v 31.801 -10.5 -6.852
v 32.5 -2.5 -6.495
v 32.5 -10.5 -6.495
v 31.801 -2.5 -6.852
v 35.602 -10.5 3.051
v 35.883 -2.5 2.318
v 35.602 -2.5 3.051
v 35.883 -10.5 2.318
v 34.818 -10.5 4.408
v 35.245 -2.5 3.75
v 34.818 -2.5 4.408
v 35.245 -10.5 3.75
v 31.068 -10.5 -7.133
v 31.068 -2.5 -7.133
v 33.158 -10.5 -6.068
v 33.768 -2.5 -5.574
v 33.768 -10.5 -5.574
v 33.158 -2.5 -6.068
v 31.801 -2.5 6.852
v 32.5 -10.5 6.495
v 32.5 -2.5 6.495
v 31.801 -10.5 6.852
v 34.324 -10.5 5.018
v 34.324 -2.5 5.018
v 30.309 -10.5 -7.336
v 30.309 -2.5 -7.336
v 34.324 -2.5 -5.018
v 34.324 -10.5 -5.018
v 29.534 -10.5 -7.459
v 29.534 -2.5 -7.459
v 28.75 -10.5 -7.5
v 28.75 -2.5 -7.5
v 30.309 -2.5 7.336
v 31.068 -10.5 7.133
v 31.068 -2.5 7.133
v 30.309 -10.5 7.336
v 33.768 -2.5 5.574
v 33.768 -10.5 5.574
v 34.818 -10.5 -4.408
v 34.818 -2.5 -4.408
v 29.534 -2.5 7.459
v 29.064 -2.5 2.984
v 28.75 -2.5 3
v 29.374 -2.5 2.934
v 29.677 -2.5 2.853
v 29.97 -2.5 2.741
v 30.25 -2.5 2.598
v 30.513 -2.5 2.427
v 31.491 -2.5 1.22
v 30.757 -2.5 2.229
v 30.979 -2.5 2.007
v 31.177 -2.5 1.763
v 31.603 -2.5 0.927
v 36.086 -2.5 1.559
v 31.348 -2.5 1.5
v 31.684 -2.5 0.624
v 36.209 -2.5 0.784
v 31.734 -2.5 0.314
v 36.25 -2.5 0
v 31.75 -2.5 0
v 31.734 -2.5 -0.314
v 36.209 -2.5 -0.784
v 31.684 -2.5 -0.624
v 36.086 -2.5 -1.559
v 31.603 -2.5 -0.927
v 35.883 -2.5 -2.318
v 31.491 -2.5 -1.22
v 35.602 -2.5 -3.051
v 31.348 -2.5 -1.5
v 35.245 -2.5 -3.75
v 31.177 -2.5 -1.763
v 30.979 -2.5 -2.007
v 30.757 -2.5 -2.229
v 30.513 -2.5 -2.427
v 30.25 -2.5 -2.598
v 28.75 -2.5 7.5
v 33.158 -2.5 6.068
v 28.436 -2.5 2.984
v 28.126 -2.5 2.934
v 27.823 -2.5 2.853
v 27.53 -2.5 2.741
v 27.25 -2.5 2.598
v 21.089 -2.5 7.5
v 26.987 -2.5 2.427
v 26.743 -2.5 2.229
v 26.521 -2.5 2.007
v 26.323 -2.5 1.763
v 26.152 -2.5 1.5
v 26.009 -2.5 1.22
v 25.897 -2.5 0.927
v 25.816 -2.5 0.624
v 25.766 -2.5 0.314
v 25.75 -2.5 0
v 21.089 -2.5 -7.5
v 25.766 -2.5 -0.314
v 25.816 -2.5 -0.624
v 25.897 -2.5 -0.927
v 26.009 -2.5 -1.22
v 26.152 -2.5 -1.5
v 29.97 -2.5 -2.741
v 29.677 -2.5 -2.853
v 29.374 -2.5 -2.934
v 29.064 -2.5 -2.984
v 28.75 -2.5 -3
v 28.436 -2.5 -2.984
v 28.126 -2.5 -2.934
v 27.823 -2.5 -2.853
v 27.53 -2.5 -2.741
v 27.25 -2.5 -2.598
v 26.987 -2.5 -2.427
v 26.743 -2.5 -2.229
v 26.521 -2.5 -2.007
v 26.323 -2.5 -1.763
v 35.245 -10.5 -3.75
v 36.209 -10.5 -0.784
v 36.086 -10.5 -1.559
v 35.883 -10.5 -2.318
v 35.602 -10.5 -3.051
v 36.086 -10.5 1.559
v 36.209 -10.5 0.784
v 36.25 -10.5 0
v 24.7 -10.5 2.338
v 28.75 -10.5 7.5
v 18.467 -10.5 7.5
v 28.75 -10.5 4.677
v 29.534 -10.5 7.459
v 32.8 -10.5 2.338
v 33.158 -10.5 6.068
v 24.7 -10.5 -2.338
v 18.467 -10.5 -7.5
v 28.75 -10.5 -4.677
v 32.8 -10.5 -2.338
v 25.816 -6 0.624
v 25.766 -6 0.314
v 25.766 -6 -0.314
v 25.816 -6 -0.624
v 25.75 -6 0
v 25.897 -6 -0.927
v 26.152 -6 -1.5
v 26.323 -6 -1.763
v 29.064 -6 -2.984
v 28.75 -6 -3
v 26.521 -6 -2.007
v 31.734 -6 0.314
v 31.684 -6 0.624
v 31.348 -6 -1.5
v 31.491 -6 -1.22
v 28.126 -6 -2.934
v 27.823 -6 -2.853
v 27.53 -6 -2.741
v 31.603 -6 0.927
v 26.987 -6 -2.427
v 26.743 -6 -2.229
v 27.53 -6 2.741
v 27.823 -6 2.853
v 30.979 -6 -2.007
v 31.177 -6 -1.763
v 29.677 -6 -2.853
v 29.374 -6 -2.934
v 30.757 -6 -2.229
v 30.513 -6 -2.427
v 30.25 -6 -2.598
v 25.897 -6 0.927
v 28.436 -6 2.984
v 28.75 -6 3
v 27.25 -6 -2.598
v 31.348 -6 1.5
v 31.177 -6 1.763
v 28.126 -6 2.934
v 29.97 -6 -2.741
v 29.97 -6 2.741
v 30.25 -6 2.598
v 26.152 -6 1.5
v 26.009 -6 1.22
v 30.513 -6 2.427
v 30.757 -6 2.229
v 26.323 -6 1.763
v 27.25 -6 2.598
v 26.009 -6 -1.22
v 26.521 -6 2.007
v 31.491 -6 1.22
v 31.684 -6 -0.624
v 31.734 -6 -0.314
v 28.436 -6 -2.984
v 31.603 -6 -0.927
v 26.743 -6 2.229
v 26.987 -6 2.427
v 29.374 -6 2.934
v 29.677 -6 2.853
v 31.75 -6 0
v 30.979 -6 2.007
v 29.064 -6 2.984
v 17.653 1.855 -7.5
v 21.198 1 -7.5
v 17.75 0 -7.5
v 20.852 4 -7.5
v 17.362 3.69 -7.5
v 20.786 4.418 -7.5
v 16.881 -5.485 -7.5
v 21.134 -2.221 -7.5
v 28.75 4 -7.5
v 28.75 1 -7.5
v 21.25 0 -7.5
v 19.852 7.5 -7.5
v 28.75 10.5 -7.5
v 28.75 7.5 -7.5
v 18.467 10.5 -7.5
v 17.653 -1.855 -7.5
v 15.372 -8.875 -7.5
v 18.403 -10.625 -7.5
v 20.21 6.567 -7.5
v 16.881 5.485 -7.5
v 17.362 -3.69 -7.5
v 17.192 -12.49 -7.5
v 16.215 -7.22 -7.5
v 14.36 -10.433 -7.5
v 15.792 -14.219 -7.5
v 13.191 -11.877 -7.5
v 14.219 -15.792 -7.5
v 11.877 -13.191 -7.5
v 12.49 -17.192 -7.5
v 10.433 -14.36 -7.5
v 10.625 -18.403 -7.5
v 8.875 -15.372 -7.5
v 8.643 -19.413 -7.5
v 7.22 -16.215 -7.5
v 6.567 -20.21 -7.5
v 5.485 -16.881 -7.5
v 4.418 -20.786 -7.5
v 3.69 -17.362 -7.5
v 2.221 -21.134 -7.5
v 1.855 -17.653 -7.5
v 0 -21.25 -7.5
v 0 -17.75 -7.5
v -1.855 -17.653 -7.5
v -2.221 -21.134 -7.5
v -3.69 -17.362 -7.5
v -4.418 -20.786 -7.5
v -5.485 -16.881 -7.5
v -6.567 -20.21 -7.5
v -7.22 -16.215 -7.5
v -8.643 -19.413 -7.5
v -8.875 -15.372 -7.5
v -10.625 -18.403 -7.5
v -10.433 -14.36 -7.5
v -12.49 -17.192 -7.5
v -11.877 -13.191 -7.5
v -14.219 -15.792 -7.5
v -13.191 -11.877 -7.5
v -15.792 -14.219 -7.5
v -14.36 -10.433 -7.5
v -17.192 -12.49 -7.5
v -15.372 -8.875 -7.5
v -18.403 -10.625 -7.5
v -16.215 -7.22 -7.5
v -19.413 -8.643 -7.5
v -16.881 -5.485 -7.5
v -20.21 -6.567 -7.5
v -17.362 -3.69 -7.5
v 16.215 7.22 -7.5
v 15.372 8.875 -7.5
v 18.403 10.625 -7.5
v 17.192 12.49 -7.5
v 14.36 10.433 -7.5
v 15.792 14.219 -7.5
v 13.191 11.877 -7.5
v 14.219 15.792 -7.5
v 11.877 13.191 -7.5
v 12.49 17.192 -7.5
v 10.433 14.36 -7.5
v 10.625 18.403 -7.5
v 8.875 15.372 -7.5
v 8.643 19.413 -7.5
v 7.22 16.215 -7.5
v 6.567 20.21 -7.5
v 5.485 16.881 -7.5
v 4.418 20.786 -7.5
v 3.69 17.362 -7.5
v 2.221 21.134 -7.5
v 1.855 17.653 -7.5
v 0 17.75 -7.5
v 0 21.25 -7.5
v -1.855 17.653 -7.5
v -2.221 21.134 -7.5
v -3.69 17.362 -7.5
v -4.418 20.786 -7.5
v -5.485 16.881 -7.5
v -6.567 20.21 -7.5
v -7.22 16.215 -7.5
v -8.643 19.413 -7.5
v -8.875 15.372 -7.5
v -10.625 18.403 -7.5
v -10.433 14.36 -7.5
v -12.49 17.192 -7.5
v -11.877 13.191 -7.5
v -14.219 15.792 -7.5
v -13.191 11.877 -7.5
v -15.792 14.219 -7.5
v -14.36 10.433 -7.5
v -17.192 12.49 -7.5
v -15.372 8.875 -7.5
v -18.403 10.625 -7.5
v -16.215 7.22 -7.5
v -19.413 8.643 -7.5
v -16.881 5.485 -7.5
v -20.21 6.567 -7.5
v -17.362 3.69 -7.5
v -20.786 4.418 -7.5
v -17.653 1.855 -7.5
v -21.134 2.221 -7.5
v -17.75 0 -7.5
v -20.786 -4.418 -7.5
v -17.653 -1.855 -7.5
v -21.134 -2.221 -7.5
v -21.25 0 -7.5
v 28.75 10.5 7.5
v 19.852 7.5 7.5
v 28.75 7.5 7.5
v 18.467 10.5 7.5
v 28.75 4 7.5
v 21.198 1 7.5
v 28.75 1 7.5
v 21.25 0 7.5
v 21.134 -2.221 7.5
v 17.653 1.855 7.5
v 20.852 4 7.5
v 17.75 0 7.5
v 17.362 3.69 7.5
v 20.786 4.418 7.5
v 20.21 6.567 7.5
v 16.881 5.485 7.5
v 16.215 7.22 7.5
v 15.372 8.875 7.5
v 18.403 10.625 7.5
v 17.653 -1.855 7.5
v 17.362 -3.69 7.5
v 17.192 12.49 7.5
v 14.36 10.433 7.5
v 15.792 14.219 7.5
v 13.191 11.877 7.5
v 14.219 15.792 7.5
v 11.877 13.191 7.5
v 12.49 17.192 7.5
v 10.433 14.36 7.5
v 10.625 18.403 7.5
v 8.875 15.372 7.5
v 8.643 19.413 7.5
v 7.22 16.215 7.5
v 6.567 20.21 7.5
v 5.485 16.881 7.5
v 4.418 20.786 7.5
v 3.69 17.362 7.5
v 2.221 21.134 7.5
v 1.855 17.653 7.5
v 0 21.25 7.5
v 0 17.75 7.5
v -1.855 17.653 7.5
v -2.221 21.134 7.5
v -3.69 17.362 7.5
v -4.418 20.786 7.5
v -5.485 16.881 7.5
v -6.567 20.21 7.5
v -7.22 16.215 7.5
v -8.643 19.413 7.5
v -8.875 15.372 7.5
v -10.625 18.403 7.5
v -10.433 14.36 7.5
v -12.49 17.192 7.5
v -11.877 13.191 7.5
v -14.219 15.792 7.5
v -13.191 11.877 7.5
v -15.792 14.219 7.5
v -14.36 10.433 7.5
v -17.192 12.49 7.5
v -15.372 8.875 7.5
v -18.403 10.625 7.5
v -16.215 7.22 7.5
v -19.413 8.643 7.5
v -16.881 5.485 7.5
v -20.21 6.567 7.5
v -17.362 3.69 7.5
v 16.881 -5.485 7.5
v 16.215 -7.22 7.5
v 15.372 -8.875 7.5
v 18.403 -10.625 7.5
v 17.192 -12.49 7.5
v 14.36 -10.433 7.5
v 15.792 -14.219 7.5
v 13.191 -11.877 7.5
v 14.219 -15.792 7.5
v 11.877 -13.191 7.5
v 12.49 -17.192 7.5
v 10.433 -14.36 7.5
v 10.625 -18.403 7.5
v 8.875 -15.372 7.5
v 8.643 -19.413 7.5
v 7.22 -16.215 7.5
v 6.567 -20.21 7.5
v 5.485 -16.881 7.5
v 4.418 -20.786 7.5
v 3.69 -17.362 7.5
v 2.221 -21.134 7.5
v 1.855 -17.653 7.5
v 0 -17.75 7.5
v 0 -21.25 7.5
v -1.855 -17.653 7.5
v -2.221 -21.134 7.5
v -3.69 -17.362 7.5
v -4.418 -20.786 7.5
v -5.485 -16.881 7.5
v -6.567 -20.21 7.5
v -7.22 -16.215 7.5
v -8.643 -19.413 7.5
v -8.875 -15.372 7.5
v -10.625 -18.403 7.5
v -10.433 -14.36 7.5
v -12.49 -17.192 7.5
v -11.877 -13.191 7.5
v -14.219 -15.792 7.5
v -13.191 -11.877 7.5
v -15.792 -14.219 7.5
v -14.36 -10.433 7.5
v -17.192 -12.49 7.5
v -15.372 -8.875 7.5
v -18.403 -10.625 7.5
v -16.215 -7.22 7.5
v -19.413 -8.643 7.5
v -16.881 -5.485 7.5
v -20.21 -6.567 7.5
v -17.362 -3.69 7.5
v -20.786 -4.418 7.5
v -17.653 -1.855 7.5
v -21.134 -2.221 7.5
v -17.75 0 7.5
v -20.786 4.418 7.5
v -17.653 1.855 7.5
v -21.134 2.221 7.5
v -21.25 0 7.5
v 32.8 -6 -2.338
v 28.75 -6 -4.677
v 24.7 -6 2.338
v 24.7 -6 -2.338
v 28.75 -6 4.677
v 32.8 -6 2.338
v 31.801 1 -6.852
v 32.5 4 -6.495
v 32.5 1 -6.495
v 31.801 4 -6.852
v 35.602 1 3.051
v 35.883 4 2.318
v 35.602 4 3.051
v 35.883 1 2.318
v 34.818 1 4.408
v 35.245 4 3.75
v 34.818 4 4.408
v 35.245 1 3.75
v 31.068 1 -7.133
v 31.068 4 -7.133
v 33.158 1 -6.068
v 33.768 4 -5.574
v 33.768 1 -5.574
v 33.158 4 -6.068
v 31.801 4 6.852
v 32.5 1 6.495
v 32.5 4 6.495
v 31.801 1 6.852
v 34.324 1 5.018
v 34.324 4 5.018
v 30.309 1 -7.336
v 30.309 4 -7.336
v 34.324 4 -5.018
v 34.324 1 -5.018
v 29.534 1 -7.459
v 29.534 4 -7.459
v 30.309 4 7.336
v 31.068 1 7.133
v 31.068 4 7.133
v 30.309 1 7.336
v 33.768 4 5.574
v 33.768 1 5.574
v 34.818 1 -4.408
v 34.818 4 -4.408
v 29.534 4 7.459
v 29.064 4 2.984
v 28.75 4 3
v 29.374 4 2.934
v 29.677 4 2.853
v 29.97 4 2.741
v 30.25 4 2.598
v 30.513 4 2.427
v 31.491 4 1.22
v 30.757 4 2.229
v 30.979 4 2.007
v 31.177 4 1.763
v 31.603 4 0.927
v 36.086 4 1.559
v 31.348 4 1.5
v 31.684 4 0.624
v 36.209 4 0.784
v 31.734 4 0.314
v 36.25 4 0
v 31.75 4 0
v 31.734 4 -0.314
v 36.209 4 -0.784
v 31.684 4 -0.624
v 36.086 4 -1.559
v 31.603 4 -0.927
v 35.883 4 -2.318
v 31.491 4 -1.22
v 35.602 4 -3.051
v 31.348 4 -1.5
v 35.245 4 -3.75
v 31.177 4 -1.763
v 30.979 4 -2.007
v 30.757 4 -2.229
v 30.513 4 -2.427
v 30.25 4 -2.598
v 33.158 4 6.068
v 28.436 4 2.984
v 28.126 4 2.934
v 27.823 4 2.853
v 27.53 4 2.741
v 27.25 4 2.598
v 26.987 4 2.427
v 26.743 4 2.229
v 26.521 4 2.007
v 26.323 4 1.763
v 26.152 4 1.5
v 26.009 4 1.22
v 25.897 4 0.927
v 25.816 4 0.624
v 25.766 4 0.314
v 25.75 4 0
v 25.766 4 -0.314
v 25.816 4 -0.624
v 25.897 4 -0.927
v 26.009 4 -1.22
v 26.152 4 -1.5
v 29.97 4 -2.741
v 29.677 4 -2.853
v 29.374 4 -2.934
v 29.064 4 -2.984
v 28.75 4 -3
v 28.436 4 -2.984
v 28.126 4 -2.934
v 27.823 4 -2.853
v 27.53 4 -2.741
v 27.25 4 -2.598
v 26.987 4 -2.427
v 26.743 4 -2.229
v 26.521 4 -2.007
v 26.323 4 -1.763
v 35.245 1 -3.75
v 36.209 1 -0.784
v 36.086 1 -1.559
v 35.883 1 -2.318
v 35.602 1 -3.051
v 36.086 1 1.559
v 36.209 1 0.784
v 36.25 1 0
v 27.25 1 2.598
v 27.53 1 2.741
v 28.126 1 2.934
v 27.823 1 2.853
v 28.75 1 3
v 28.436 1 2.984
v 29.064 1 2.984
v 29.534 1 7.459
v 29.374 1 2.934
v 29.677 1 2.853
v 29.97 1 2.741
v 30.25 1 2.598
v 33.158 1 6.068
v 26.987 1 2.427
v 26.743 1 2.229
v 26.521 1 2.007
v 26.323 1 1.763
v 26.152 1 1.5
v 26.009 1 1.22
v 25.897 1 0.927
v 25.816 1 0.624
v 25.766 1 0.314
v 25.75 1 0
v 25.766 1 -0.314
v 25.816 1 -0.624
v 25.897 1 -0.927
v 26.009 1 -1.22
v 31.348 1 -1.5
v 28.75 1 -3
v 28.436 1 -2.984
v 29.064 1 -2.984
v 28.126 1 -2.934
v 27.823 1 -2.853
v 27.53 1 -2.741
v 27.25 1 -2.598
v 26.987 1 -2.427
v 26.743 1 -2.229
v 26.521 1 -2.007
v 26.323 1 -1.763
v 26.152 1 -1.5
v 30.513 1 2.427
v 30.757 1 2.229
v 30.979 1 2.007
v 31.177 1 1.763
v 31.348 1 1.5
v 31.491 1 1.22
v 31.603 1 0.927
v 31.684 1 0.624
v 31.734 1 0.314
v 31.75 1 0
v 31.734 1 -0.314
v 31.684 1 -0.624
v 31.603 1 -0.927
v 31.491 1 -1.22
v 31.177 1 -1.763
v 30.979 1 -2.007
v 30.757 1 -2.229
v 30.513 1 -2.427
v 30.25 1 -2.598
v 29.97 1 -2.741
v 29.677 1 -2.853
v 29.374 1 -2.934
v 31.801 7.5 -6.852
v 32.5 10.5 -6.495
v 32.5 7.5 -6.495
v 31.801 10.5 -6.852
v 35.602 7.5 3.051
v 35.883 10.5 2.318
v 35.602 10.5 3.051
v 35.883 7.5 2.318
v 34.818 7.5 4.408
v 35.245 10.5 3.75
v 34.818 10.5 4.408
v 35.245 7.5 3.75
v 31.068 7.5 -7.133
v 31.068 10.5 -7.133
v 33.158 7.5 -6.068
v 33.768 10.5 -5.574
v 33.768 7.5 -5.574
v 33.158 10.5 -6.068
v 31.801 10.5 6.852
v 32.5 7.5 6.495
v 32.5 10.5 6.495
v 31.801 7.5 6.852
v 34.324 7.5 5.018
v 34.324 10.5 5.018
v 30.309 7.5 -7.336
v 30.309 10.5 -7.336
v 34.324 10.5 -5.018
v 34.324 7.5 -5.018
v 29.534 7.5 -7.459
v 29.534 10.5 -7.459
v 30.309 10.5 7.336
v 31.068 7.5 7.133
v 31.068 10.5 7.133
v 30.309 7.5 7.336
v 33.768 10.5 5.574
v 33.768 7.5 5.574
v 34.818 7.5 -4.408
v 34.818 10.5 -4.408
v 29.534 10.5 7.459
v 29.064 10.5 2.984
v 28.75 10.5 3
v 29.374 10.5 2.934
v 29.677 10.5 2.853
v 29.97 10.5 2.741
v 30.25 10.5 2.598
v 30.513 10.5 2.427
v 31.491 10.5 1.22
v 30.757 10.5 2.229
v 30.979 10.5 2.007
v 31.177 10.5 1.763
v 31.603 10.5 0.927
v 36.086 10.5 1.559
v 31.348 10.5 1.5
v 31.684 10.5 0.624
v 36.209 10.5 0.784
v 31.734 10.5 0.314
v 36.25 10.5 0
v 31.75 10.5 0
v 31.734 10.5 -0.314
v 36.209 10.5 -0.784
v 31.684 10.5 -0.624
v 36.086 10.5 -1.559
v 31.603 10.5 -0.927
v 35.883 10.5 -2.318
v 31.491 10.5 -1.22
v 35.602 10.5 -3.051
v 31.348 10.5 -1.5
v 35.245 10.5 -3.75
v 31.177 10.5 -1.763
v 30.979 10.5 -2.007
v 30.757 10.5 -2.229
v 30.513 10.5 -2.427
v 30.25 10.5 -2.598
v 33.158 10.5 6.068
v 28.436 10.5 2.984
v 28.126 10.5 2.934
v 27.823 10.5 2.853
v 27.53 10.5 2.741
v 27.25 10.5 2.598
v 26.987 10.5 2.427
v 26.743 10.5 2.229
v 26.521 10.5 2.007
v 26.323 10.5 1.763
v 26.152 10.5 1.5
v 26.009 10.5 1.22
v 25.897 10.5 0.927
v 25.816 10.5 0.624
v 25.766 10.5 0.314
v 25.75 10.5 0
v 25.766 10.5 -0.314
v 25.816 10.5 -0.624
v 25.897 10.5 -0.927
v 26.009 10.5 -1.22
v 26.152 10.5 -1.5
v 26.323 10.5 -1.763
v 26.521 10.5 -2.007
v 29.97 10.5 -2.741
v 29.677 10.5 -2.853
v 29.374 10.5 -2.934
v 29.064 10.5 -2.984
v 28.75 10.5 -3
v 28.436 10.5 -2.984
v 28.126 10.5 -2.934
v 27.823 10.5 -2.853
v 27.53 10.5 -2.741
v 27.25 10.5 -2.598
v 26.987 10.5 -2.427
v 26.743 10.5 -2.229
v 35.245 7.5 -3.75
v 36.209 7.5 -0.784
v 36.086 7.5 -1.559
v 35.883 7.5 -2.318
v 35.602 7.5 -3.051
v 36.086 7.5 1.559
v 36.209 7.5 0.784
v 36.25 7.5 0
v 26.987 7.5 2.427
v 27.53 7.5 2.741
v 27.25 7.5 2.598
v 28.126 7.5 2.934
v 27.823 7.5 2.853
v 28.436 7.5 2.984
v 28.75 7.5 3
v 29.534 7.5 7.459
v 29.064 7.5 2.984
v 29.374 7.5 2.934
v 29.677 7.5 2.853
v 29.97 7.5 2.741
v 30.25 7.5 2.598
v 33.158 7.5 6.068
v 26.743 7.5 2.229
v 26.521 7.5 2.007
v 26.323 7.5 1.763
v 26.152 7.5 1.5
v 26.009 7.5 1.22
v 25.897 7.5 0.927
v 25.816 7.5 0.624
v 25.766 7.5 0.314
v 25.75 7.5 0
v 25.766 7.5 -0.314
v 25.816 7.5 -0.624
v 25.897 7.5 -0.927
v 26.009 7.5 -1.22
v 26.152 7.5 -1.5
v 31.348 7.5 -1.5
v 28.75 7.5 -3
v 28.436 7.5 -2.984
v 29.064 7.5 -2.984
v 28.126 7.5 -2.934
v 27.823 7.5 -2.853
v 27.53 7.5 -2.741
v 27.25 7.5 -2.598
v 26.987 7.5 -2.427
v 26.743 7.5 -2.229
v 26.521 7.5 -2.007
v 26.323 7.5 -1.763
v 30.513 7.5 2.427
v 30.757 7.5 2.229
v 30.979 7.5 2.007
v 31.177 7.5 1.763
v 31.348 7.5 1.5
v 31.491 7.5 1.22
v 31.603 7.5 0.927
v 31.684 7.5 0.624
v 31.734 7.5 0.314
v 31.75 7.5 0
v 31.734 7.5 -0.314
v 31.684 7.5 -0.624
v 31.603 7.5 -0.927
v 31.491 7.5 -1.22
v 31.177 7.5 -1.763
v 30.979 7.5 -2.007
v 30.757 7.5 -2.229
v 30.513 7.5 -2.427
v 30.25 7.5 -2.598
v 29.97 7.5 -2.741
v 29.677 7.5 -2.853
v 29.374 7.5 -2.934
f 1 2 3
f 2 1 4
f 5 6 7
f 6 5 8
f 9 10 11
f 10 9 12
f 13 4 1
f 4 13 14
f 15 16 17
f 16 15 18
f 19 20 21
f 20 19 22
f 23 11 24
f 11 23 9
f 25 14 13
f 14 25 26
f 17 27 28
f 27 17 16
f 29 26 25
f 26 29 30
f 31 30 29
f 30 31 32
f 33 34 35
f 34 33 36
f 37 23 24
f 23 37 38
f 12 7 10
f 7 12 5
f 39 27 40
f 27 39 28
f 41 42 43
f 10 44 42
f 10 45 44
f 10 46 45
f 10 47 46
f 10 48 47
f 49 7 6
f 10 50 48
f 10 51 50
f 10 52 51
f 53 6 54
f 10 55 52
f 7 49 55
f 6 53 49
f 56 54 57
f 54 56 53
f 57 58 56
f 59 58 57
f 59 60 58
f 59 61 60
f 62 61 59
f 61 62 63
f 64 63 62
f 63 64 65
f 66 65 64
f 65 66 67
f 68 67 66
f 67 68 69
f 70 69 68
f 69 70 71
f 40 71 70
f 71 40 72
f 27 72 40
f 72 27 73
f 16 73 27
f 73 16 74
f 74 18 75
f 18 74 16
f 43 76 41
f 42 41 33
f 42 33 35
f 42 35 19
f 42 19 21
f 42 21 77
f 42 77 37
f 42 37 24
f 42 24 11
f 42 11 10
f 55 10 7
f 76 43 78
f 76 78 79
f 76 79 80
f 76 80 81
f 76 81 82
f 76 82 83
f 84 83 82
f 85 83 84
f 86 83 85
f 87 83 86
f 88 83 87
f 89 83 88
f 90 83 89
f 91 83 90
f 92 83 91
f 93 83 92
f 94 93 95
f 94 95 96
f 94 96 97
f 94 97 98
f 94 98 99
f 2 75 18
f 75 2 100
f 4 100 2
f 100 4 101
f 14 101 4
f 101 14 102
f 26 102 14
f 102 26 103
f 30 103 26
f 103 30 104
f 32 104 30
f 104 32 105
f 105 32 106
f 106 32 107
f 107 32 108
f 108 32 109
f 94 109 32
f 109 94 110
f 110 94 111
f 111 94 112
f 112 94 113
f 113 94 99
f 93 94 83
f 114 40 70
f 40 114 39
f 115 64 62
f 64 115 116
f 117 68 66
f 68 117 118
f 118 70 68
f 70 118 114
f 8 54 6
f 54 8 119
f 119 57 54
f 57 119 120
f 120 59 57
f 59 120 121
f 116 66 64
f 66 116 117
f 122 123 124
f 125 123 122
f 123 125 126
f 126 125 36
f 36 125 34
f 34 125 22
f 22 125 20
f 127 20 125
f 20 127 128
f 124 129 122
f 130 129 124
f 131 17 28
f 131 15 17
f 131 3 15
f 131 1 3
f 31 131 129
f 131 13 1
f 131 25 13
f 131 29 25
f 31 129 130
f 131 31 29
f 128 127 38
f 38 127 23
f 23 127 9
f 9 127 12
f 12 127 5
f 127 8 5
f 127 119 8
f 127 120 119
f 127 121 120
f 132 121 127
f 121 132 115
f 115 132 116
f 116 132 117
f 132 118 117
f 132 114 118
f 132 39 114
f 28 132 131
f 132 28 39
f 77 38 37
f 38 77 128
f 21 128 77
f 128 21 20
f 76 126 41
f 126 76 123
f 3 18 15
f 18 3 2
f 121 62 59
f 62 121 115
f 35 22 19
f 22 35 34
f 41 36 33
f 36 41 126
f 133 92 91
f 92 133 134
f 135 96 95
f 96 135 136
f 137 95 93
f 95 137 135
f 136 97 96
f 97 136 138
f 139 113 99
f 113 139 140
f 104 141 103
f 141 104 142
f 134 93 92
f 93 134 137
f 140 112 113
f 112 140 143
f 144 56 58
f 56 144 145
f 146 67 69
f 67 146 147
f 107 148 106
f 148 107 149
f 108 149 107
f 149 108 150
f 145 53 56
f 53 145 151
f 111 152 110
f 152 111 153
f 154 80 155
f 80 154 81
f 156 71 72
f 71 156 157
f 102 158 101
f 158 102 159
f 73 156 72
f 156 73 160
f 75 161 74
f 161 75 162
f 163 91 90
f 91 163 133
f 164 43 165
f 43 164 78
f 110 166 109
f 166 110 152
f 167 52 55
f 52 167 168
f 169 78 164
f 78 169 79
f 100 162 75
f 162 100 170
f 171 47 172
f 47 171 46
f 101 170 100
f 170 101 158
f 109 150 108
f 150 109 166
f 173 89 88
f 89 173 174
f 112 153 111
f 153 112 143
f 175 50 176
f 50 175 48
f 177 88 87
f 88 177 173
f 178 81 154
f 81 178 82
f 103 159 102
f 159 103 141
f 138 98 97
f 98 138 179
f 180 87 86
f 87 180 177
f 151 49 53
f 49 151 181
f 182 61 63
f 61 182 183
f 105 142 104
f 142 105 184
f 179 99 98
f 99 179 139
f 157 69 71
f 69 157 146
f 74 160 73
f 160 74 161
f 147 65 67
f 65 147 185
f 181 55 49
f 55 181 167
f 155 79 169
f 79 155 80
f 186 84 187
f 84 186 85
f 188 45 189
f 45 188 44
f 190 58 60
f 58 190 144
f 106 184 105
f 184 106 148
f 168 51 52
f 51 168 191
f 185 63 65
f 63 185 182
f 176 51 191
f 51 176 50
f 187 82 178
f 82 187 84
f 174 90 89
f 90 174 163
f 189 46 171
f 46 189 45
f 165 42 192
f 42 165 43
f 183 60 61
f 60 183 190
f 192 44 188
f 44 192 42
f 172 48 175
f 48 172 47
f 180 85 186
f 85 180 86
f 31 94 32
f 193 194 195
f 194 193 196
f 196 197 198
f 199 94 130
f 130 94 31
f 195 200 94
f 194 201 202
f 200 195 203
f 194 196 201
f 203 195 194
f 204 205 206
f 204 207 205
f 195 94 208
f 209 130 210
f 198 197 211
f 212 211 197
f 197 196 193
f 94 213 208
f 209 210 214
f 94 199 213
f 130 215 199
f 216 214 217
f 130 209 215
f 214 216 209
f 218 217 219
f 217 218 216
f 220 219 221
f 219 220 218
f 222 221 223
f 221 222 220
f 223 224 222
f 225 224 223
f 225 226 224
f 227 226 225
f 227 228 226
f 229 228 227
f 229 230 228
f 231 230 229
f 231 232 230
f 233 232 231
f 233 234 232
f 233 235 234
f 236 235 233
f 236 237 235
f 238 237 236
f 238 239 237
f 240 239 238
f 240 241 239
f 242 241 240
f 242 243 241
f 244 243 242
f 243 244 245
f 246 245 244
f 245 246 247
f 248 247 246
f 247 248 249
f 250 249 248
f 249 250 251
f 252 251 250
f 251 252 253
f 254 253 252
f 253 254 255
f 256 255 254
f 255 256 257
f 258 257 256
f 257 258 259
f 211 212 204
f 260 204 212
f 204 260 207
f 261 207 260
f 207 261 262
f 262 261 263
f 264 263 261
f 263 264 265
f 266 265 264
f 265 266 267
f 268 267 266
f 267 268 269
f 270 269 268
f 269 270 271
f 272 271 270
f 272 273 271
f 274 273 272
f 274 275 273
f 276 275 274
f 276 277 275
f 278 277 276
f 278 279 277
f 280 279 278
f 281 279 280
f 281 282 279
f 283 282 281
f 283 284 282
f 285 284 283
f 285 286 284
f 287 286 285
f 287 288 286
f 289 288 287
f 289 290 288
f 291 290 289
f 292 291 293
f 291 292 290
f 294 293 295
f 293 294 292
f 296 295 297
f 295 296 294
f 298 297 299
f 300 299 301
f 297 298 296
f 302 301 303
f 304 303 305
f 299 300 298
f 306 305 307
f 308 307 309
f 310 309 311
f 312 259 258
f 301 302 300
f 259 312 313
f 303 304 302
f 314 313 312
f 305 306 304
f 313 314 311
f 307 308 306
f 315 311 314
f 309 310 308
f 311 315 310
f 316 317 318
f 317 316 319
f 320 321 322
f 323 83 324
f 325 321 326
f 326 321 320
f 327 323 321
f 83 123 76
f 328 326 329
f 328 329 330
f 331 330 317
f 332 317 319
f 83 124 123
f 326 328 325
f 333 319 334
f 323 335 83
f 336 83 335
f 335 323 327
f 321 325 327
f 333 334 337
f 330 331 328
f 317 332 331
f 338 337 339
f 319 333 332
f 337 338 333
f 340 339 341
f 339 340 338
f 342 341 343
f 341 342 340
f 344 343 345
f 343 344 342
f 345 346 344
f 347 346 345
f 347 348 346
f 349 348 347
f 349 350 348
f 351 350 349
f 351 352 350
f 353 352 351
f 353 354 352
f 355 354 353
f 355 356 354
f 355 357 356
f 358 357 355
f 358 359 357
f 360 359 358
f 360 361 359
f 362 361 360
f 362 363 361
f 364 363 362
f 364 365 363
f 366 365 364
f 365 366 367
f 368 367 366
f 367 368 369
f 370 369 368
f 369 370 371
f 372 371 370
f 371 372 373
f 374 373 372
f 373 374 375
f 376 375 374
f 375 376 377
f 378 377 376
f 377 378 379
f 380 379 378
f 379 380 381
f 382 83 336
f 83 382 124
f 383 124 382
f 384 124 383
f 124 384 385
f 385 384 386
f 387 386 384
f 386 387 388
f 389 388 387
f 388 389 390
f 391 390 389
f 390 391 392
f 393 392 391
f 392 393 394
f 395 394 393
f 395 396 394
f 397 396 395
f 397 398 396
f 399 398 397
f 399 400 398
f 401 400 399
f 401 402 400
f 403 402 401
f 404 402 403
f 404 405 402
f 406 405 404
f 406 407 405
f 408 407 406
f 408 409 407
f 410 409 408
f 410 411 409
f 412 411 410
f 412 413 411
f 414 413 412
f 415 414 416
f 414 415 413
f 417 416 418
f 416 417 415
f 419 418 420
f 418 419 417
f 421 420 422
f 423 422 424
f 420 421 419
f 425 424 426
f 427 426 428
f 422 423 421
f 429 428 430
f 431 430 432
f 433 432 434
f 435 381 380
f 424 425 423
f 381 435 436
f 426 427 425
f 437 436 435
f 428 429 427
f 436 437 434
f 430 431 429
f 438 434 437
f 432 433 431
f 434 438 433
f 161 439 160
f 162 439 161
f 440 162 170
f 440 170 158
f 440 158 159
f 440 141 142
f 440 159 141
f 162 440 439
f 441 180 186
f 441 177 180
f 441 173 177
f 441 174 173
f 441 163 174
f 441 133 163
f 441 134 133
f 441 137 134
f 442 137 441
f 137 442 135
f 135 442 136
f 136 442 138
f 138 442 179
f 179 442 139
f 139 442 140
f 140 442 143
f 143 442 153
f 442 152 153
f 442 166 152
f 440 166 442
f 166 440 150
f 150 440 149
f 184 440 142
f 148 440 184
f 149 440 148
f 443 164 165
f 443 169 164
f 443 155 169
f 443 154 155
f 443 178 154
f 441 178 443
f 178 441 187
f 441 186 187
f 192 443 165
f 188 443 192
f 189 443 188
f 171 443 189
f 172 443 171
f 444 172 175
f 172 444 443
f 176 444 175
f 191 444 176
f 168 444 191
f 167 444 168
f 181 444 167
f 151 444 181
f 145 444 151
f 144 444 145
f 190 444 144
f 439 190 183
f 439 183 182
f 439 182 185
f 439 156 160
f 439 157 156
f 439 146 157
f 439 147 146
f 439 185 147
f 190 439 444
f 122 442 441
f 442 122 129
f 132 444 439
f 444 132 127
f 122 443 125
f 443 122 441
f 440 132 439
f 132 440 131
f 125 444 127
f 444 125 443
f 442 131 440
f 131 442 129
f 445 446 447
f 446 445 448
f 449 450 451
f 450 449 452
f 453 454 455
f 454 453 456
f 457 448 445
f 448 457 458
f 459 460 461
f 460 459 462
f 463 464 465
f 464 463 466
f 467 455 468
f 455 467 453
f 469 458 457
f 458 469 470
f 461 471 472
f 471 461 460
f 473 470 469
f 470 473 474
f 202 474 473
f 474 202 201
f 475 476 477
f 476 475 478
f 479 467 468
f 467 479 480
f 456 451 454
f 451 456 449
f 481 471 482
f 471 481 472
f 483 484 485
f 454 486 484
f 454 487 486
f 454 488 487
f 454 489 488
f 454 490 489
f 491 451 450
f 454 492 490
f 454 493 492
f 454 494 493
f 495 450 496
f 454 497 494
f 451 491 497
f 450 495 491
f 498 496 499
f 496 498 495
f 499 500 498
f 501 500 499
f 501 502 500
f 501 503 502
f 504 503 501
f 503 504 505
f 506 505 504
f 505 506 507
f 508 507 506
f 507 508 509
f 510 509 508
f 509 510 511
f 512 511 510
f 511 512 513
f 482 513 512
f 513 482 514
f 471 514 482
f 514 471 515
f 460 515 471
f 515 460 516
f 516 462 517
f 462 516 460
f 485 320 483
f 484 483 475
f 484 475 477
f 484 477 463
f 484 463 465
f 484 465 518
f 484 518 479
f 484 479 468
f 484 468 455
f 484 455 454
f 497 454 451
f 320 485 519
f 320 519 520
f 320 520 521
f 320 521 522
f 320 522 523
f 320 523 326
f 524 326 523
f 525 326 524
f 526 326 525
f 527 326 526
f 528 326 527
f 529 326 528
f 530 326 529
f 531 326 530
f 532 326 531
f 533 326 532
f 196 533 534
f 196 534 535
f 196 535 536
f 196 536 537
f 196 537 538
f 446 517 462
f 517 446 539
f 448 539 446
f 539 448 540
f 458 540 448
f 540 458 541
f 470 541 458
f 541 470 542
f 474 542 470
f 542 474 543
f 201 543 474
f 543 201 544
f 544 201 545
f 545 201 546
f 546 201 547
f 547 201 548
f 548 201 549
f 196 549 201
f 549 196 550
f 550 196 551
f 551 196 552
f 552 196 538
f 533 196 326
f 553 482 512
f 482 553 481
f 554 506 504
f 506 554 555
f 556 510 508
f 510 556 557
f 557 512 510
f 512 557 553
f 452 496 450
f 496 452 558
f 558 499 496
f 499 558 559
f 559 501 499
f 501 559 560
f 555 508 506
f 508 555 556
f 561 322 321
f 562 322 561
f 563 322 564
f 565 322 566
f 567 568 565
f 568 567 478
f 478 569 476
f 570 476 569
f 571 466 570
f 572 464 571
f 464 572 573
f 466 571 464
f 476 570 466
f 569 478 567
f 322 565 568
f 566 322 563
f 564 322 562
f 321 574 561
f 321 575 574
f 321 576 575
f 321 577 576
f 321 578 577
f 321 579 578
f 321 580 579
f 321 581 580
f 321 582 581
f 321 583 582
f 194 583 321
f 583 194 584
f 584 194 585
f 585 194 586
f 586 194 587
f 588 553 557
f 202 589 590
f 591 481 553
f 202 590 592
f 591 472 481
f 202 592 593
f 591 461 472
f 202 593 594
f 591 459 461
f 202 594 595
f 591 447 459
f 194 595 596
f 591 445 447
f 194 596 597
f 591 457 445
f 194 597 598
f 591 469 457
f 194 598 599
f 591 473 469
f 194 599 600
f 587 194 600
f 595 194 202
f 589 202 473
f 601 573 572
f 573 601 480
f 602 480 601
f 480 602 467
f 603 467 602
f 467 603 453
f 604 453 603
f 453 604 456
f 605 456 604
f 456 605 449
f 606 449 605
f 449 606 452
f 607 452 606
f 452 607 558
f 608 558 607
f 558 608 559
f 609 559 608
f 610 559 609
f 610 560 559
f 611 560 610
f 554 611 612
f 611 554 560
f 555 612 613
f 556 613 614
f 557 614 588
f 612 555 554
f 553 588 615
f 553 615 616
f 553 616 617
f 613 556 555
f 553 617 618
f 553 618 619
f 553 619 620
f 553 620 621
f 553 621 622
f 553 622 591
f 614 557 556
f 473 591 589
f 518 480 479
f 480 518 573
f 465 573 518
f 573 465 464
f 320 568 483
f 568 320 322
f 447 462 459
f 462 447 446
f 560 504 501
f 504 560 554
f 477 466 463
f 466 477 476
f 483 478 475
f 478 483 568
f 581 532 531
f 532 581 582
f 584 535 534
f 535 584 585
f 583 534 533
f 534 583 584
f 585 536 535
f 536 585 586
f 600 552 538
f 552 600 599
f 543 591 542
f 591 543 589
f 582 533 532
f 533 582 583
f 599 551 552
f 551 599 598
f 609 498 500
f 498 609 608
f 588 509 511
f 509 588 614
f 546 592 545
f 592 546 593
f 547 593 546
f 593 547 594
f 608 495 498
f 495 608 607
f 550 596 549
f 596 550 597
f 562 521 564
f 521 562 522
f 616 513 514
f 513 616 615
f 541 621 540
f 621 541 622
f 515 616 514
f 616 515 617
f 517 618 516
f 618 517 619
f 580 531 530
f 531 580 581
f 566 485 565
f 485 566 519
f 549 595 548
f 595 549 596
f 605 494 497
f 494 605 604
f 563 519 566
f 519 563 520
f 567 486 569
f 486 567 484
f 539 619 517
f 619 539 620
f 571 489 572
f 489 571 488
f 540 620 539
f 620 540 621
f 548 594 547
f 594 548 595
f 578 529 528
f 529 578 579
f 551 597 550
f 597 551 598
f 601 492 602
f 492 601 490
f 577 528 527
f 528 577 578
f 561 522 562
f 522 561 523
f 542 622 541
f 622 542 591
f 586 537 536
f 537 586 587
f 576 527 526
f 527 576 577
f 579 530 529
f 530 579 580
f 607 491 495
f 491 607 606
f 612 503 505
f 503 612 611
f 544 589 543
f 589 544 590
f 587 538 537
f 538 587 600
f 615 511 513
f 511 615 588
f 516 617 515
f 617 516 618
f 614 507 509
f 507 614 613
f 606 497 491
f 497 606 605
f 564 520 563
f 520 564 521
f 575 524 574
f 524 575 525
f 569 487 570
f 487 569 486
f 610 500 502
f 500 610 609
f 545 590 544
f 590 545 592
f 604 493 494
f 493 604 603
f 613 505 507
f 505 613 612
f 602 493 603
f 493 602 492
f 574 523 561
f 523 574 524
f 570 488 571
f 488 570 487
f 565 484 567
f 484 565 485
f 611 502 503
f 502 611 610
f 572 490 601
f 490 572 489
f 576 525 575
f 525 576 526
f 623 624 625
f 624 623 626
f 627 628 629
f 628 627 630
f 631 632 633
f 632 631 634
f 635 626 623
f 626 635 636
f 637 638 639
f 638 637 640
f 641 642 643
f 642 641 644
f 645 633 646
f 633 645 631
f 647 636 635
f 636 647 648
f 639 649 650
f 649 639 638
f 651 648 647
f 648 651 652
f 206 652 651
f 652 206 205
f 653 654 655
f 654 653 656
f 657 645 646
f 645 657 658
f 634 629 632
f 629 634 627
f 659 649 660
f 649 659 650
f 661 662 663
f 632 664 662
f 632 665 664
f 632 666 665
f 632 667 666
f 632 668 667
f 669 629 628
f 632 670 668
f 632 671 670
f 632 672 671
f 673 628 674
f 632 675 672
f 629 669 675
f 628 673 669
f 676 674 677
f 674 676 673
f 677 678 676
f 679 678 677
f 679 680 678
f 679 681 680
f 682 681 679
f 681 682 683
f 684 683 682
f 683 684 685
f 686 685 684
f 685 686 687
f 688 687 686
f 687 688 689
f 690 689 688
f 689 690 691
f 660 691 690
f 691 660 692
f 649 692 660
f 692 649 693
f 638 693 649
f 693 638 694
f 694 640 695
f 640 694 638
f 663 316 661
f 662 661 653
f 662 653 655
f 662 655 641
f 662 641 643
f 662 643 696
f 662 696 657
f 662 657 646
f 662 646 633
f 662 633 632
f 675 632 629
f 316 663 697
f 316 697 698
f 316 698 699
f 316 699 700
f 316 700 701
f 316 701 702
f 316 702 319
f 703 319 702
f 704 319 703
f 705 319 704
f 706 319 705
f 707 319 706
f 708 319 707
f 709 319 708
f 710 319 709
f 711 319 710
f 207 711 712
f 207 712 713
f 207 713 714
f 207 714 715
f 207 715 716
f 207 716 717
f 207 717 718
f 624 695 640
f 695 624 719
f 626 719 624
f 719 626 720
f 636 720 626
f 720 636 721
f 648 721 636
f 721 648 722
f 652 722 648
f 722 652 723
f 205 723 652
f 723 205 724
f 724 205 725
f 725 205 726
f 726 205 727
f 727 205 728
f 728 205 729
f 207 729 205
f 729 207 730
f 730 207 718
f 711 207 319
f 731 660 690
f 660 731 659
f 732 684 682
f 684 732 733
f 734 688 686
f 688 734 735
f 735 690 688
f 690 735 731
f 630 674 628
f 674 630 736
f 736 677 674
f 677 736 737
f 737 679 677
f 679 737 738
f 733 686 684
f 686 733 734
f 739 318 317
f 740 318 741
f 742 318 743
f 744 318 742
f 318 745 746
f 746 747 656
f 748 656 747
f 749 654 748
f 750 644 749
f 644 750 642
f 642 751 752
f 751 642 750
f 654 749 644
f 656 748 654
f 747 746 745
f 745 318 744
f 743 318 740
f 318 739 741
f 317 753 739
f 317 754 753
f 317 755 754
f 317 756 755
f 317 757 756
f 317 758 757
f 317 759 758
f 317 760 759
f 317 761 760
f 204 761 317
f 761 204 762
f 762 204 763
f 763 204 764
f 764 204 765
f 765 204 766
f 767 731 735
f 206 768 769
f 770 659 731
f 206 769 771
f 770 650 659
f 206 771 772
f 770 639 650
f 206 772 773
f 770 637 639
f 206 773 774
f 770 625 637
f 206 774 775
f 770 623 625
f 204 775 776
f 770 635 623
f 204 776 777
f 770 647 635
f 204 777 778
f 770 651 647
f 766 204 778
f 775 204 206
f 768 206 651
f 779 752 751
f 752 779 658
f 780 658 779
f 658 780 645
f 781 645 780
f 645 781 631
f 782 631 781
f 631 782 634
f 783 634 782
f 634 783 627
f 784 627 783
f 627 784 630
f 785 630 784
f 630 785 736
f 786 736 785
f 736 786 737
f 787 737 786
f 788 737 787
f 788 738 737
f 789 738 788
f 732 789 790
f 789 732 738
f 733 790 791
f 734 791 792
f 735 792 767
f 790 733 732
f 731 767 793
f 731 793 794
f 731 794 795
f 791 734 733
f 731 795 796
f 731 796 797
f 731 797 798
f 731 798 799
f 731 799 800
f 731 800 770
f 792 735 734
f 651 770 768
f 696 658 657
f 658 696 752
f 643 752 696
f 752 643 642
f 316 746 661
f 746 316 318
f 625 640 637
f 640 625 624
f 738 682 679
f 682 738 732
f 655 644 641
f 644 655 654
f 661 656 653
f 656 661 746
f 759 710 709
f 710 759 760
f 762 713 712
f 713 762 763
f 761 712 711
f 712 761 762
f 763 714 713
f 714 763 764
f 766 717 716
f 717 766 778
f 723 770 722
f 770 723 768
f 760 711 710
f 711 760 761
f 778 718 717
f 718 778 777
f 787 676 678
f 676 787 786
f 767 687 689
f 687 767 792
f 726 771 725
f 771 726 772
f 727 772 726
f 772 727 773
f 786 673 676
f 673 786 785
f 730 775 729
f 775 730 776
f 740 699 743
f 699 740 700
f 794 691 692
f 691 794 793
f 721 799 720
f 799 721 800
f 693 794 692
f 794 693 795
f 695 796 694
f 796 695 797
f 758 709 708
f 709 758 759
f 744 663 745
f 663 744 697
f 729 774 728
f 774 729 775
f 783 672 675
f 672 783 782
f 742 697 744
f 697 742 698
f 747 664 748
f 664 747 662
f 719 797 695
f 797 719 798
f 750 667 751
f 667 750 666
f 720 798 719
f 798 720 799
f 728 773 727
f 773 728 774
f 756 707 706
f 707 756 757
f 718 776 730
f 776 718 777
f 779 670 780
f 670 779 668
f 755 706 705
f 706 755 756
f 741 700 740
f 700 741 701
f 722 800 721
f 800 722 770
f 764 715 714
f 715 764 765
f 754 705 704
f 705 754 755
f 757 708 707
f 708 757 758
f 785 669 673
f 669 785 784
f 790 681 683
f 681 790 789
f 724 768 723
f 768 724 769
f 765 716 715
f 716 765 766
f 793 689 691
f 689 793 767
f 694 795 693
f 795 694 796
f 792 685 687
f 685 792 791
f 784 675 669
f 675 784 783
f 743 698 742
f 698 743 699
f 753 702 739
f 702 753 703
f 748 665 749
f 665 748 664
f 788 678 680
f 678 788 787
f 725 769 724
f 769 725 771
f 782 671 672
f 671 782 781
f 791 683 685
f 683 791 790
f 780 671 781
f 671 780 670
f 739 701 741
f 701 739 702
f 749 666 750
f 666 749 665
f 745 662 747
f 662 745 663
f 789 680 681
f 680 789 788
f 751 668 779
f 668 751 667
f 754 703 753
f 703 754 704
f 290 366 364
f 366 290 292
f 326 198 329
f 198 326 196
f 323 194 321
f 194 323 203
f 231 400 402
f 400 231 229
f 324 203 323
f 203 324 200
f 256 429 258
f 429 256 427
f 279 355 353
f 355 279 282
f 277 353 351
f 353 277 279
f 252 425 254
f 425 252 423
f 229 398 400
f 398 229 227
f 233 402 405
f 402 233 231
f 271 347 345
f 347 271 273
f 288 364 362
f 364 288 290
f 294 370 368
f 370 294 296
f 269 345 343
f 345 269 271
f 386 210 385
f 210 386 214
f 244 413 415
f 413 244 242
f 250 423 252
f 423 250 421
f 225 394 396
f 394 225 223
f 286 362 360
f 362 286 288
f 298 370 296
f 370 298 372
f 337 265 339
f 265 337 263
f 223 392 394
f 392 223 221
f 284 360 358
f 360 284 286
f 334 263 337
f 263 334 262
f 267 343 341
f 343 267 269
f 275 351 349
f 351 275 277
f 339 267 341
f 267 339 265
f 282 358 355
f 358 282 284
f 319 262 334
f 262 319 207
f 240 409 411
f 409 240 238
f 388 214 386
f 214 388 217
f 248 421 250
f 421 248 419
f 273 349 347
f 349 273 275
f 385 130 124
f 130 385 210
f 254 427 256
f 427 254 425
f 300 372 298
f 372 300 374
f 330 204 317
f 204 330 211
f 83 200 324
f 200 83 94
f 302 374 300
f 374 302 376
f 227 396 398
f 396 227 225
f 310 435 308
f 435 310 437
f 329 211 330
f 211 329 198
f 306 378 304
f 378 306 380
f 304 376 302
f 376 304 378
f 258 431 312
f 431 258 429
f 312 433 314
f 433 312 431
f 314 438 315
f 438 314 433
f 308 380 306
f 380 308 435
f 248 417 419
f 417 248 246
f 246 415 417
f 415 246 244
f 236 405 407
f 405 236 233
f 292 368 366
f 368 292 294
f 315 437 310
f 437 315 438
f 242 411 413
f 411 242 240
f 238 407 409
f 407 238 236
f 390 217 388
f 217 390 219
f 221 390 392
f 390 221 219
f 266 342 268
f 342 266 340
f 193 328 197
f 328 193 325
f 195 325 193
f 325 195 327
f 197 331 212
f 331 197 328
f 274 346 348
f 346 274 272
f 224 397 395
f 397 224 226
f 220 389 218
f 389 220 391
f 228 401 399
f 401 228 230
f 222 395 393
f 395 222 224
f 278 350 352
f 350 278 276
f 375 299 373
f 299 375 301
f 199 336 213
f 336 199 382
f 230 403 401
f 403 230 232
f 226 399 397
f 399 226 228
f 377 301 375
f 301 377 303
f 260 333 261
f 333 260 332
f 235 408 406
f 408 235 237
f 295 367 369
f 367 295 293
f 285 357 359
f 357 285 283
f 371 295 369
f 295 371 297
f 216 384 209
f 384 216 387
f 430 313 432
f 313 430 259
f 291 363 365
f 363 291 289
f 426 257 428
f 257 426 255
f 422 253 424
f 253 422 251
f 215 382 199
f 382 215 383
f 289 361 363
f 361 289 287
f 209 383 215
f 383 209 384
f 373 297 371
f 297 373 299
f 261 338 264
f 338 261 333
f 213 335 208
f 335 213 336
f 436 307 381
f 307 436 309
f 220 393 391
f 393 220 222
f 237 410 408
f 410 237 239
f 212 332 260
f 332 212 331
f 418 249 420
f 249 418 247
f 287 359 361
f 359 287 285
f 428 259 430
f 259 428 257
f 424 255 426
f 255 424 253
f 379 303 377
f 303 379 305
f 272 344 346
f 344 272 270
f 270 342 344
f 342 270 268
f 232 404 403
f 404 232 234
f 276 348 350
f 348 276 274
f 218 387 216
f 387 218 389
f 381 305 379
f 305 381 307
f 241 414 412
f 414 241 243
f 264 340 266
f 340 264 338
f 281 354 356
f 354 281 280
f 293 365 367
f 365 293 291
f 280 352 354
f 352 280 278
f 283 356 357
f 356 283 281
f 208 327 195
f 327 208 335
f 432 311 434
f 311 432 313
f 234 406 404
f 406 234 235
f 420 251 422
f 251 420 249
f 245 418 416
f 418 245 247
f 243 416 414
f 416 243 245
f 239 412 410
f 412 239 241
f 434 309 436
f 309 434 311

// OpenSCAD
// file: ../lib/GoPro_Mount.scad
/*
Author: DMCShep
https://www.thingiverse.com/thing:3088912/files
License
Basic GoPro Mount - OpenSCAD byDMCShepis licensed under theBSD Licenselicense.
*/
$fa = 2;
$fs = 0.25;
Extra_Mount_Depth = 3;

module nut_hole()
{
	rotate([0, 90, 0]) // (Un)comment to rotate nut hole
	rotate([90, 0, 0])
		for(i = [0:(360 / 3):359])
		{
			rotate([0, 0, i])
				cube([4.6765, 8.1, 5], center = true);
		}
}

module flap(Width)
{
	rotate([90, 0, 0])
	union()
	{
		translate([3.5, (-7.5), 0])
			cube([4 + Extra_Mount_Depth, 15, Width]);


		translate([0, (-7.5), 0])
			cube([7.5 + Extra_Mount_Depth, 4, Width]);

		translate([0, 3.5, 0])
			cube([7.5 + Extra_Mount_Depth, 4, Width]);

		difference()
		{
			cylinder(h = Width, d = 15);

			translate([0, 0, (-1)])
				cylinder(h = Width + 2, d = 6);
		}
	}
}

module mount2()
{
	union()
	{

			translate([0, 4, 0])
		flap(3);

		translate([0, 10.5, 0])
		flap(3);
	}
}

module mount3()
{
	union()
	{
		difference()
		{
			translate([0, (-2.5), 0])
				flap(8);

			translate([0, (-8.5), 0])
				nut_hole();
		}

		mount2();
	}
}

/* GoPro Mount - 2 flap no nut hole
translate([0, 0, 10.5])
	rotate([0, 90, 0])
		mount2();
// */

//* GoPro Mount - 3 flap w/nut hole
translate([0, 0, 10.5])
	rotate([0, 90, 0])
		mount3();
// */
// file: ../lib/utils.scad
///< Utilities

function rand_clr() = rands( 0,1,3 );

///< Length conversions
function in2mm( i ) = ( i * 25.4 ); 
function mm2in( m ) = ( m / 25.4 );

/// This is pulled from stackoverflow
/// https://stackoverflow.com/questions/45826208/openscad-rotating-around-a-particular-point

// rotate as per a, v, but around point pt
module rotate_about_pt(a, v, pt) {
    translate(pt)
        rotate(a,v)
            translate(-pt)
                children();   
}

function adjust_z_offset( v, z ) = [for (i=[0:(len(v)-1)]) v[i]+[0,0,z]] ;

///< For each child, translate child by <p> point in points
module foreach_translate(points ){
	for (p=points){
		translate(p) children();
	}
}
// file: ../lib/math.scad
///< Math scad module


///< Find the hypotenuse from two sides of a right triangle
function hyp_from_sides( a, b ) = sqrt( pow( a, 2 ) + pow( b, 2 ) );

///< Find equal sides from hypotenuse of a right triangle
function sides_from_hyp(h) = sqrt( pow( h, 2 ) / 2 );

///< Find A from hypotenuse and B
function a_from_hb( h, b ) = sqrt( pow( h, 2 ) - pow( b, 2 ) );

function dist_2d( pt2, pt1 ) = sqrt(pow(( pt2[0]-pt1[0] ),2) + pow(( pt2[1]-pt1[1]),2) );

function mid_pt_2d( pt2, pt1 ) = [( pt1[0]+pt2[0] )/2, ( pt1[1]+pt2[1] )/2, 0 ];
///< Test for math functions

A = 3;
B = 4;
echo("Given A=", A, "and B=", B );
H = hyp_from_sides( A, B );
echo("Hypotenuse=", H );
echo("Calc Correct = ", (H == 5) );

echo("Given H=", H, " which is a hypotenuse with equal sides" );
echo( "the sides=", sides_from_hyp( H ) );

echo("Given H=", H, "B=", 4 );
echo("A=", a_from_hb( H, 4 ) );

echo("Distance from [-1,1] and [3,4] = ", dist_2d( [-1,1],[3,4]) );

///< Find the sum of a vector <vect> starting from <s> and continuing to <i>
function sumv( vect, i, s=0 ) = ( i == s ? vect[ i ] : vect[ i ] + sumv( vect, i - 1, s ) );
vec = [ 1, 2, 3, 4 ];
l = len( vec )-1;
echo( "Sum vec = ", sumv( vec, l, 0 ) );

///< Find the average of a vector <vect> starting at <s>
function average( vect, s=0 ) = (len( vect ) == 0 ? 0 : ( sumv( vect, len( vect ) - 1, s )/len(vect) ) );
echo( "Ave vec = ", average( vec ) );
vec2 = [];
echo( "Ave vec2 = ", average( vec2 ) );
// main file
///< Object definition
use <../lib/math.scad>;
use <../lib/utils.scad>;
use <../lib/GoPro_Mount.scad>;

///< Parameters
$fn = 60; ///Finish
ring_thickness      =  7.0;
inner_ring_diameter = 35.5;
outer_ring_diameter = inner_ring_diameter + ring_thickness ;
inner_ring_radius   = inner_ring_diameter/2;
outer_ring_radius   = outer_ring_diameter/2;

ring_height =  15.00;
gp_offset   = outer_ring_radius - 3;


///< Modules
module RingMount( height, inner_radius, outer_radius, center = true ){
    difference(){
        color( rand_clr())cylinder( h = height, r = outer_radius, center = center );
        color( rand_clr())cylinder( h = height, r = inner_radius, center = center );
    }
}


module GoProMount(){
    ///< GoPro Mount - 3 flap w/nut hole
    translate([0, 0, 10.5])
    	rotate([0, 90, 0])
    		mount3();
}
///< Build object
union(){
translate( [gp_offset,0,0] )rotate( [0,90,0] )GoProMount();
RingMount( ring_height, inner_ring_radius, outer_ring_radius );
}
